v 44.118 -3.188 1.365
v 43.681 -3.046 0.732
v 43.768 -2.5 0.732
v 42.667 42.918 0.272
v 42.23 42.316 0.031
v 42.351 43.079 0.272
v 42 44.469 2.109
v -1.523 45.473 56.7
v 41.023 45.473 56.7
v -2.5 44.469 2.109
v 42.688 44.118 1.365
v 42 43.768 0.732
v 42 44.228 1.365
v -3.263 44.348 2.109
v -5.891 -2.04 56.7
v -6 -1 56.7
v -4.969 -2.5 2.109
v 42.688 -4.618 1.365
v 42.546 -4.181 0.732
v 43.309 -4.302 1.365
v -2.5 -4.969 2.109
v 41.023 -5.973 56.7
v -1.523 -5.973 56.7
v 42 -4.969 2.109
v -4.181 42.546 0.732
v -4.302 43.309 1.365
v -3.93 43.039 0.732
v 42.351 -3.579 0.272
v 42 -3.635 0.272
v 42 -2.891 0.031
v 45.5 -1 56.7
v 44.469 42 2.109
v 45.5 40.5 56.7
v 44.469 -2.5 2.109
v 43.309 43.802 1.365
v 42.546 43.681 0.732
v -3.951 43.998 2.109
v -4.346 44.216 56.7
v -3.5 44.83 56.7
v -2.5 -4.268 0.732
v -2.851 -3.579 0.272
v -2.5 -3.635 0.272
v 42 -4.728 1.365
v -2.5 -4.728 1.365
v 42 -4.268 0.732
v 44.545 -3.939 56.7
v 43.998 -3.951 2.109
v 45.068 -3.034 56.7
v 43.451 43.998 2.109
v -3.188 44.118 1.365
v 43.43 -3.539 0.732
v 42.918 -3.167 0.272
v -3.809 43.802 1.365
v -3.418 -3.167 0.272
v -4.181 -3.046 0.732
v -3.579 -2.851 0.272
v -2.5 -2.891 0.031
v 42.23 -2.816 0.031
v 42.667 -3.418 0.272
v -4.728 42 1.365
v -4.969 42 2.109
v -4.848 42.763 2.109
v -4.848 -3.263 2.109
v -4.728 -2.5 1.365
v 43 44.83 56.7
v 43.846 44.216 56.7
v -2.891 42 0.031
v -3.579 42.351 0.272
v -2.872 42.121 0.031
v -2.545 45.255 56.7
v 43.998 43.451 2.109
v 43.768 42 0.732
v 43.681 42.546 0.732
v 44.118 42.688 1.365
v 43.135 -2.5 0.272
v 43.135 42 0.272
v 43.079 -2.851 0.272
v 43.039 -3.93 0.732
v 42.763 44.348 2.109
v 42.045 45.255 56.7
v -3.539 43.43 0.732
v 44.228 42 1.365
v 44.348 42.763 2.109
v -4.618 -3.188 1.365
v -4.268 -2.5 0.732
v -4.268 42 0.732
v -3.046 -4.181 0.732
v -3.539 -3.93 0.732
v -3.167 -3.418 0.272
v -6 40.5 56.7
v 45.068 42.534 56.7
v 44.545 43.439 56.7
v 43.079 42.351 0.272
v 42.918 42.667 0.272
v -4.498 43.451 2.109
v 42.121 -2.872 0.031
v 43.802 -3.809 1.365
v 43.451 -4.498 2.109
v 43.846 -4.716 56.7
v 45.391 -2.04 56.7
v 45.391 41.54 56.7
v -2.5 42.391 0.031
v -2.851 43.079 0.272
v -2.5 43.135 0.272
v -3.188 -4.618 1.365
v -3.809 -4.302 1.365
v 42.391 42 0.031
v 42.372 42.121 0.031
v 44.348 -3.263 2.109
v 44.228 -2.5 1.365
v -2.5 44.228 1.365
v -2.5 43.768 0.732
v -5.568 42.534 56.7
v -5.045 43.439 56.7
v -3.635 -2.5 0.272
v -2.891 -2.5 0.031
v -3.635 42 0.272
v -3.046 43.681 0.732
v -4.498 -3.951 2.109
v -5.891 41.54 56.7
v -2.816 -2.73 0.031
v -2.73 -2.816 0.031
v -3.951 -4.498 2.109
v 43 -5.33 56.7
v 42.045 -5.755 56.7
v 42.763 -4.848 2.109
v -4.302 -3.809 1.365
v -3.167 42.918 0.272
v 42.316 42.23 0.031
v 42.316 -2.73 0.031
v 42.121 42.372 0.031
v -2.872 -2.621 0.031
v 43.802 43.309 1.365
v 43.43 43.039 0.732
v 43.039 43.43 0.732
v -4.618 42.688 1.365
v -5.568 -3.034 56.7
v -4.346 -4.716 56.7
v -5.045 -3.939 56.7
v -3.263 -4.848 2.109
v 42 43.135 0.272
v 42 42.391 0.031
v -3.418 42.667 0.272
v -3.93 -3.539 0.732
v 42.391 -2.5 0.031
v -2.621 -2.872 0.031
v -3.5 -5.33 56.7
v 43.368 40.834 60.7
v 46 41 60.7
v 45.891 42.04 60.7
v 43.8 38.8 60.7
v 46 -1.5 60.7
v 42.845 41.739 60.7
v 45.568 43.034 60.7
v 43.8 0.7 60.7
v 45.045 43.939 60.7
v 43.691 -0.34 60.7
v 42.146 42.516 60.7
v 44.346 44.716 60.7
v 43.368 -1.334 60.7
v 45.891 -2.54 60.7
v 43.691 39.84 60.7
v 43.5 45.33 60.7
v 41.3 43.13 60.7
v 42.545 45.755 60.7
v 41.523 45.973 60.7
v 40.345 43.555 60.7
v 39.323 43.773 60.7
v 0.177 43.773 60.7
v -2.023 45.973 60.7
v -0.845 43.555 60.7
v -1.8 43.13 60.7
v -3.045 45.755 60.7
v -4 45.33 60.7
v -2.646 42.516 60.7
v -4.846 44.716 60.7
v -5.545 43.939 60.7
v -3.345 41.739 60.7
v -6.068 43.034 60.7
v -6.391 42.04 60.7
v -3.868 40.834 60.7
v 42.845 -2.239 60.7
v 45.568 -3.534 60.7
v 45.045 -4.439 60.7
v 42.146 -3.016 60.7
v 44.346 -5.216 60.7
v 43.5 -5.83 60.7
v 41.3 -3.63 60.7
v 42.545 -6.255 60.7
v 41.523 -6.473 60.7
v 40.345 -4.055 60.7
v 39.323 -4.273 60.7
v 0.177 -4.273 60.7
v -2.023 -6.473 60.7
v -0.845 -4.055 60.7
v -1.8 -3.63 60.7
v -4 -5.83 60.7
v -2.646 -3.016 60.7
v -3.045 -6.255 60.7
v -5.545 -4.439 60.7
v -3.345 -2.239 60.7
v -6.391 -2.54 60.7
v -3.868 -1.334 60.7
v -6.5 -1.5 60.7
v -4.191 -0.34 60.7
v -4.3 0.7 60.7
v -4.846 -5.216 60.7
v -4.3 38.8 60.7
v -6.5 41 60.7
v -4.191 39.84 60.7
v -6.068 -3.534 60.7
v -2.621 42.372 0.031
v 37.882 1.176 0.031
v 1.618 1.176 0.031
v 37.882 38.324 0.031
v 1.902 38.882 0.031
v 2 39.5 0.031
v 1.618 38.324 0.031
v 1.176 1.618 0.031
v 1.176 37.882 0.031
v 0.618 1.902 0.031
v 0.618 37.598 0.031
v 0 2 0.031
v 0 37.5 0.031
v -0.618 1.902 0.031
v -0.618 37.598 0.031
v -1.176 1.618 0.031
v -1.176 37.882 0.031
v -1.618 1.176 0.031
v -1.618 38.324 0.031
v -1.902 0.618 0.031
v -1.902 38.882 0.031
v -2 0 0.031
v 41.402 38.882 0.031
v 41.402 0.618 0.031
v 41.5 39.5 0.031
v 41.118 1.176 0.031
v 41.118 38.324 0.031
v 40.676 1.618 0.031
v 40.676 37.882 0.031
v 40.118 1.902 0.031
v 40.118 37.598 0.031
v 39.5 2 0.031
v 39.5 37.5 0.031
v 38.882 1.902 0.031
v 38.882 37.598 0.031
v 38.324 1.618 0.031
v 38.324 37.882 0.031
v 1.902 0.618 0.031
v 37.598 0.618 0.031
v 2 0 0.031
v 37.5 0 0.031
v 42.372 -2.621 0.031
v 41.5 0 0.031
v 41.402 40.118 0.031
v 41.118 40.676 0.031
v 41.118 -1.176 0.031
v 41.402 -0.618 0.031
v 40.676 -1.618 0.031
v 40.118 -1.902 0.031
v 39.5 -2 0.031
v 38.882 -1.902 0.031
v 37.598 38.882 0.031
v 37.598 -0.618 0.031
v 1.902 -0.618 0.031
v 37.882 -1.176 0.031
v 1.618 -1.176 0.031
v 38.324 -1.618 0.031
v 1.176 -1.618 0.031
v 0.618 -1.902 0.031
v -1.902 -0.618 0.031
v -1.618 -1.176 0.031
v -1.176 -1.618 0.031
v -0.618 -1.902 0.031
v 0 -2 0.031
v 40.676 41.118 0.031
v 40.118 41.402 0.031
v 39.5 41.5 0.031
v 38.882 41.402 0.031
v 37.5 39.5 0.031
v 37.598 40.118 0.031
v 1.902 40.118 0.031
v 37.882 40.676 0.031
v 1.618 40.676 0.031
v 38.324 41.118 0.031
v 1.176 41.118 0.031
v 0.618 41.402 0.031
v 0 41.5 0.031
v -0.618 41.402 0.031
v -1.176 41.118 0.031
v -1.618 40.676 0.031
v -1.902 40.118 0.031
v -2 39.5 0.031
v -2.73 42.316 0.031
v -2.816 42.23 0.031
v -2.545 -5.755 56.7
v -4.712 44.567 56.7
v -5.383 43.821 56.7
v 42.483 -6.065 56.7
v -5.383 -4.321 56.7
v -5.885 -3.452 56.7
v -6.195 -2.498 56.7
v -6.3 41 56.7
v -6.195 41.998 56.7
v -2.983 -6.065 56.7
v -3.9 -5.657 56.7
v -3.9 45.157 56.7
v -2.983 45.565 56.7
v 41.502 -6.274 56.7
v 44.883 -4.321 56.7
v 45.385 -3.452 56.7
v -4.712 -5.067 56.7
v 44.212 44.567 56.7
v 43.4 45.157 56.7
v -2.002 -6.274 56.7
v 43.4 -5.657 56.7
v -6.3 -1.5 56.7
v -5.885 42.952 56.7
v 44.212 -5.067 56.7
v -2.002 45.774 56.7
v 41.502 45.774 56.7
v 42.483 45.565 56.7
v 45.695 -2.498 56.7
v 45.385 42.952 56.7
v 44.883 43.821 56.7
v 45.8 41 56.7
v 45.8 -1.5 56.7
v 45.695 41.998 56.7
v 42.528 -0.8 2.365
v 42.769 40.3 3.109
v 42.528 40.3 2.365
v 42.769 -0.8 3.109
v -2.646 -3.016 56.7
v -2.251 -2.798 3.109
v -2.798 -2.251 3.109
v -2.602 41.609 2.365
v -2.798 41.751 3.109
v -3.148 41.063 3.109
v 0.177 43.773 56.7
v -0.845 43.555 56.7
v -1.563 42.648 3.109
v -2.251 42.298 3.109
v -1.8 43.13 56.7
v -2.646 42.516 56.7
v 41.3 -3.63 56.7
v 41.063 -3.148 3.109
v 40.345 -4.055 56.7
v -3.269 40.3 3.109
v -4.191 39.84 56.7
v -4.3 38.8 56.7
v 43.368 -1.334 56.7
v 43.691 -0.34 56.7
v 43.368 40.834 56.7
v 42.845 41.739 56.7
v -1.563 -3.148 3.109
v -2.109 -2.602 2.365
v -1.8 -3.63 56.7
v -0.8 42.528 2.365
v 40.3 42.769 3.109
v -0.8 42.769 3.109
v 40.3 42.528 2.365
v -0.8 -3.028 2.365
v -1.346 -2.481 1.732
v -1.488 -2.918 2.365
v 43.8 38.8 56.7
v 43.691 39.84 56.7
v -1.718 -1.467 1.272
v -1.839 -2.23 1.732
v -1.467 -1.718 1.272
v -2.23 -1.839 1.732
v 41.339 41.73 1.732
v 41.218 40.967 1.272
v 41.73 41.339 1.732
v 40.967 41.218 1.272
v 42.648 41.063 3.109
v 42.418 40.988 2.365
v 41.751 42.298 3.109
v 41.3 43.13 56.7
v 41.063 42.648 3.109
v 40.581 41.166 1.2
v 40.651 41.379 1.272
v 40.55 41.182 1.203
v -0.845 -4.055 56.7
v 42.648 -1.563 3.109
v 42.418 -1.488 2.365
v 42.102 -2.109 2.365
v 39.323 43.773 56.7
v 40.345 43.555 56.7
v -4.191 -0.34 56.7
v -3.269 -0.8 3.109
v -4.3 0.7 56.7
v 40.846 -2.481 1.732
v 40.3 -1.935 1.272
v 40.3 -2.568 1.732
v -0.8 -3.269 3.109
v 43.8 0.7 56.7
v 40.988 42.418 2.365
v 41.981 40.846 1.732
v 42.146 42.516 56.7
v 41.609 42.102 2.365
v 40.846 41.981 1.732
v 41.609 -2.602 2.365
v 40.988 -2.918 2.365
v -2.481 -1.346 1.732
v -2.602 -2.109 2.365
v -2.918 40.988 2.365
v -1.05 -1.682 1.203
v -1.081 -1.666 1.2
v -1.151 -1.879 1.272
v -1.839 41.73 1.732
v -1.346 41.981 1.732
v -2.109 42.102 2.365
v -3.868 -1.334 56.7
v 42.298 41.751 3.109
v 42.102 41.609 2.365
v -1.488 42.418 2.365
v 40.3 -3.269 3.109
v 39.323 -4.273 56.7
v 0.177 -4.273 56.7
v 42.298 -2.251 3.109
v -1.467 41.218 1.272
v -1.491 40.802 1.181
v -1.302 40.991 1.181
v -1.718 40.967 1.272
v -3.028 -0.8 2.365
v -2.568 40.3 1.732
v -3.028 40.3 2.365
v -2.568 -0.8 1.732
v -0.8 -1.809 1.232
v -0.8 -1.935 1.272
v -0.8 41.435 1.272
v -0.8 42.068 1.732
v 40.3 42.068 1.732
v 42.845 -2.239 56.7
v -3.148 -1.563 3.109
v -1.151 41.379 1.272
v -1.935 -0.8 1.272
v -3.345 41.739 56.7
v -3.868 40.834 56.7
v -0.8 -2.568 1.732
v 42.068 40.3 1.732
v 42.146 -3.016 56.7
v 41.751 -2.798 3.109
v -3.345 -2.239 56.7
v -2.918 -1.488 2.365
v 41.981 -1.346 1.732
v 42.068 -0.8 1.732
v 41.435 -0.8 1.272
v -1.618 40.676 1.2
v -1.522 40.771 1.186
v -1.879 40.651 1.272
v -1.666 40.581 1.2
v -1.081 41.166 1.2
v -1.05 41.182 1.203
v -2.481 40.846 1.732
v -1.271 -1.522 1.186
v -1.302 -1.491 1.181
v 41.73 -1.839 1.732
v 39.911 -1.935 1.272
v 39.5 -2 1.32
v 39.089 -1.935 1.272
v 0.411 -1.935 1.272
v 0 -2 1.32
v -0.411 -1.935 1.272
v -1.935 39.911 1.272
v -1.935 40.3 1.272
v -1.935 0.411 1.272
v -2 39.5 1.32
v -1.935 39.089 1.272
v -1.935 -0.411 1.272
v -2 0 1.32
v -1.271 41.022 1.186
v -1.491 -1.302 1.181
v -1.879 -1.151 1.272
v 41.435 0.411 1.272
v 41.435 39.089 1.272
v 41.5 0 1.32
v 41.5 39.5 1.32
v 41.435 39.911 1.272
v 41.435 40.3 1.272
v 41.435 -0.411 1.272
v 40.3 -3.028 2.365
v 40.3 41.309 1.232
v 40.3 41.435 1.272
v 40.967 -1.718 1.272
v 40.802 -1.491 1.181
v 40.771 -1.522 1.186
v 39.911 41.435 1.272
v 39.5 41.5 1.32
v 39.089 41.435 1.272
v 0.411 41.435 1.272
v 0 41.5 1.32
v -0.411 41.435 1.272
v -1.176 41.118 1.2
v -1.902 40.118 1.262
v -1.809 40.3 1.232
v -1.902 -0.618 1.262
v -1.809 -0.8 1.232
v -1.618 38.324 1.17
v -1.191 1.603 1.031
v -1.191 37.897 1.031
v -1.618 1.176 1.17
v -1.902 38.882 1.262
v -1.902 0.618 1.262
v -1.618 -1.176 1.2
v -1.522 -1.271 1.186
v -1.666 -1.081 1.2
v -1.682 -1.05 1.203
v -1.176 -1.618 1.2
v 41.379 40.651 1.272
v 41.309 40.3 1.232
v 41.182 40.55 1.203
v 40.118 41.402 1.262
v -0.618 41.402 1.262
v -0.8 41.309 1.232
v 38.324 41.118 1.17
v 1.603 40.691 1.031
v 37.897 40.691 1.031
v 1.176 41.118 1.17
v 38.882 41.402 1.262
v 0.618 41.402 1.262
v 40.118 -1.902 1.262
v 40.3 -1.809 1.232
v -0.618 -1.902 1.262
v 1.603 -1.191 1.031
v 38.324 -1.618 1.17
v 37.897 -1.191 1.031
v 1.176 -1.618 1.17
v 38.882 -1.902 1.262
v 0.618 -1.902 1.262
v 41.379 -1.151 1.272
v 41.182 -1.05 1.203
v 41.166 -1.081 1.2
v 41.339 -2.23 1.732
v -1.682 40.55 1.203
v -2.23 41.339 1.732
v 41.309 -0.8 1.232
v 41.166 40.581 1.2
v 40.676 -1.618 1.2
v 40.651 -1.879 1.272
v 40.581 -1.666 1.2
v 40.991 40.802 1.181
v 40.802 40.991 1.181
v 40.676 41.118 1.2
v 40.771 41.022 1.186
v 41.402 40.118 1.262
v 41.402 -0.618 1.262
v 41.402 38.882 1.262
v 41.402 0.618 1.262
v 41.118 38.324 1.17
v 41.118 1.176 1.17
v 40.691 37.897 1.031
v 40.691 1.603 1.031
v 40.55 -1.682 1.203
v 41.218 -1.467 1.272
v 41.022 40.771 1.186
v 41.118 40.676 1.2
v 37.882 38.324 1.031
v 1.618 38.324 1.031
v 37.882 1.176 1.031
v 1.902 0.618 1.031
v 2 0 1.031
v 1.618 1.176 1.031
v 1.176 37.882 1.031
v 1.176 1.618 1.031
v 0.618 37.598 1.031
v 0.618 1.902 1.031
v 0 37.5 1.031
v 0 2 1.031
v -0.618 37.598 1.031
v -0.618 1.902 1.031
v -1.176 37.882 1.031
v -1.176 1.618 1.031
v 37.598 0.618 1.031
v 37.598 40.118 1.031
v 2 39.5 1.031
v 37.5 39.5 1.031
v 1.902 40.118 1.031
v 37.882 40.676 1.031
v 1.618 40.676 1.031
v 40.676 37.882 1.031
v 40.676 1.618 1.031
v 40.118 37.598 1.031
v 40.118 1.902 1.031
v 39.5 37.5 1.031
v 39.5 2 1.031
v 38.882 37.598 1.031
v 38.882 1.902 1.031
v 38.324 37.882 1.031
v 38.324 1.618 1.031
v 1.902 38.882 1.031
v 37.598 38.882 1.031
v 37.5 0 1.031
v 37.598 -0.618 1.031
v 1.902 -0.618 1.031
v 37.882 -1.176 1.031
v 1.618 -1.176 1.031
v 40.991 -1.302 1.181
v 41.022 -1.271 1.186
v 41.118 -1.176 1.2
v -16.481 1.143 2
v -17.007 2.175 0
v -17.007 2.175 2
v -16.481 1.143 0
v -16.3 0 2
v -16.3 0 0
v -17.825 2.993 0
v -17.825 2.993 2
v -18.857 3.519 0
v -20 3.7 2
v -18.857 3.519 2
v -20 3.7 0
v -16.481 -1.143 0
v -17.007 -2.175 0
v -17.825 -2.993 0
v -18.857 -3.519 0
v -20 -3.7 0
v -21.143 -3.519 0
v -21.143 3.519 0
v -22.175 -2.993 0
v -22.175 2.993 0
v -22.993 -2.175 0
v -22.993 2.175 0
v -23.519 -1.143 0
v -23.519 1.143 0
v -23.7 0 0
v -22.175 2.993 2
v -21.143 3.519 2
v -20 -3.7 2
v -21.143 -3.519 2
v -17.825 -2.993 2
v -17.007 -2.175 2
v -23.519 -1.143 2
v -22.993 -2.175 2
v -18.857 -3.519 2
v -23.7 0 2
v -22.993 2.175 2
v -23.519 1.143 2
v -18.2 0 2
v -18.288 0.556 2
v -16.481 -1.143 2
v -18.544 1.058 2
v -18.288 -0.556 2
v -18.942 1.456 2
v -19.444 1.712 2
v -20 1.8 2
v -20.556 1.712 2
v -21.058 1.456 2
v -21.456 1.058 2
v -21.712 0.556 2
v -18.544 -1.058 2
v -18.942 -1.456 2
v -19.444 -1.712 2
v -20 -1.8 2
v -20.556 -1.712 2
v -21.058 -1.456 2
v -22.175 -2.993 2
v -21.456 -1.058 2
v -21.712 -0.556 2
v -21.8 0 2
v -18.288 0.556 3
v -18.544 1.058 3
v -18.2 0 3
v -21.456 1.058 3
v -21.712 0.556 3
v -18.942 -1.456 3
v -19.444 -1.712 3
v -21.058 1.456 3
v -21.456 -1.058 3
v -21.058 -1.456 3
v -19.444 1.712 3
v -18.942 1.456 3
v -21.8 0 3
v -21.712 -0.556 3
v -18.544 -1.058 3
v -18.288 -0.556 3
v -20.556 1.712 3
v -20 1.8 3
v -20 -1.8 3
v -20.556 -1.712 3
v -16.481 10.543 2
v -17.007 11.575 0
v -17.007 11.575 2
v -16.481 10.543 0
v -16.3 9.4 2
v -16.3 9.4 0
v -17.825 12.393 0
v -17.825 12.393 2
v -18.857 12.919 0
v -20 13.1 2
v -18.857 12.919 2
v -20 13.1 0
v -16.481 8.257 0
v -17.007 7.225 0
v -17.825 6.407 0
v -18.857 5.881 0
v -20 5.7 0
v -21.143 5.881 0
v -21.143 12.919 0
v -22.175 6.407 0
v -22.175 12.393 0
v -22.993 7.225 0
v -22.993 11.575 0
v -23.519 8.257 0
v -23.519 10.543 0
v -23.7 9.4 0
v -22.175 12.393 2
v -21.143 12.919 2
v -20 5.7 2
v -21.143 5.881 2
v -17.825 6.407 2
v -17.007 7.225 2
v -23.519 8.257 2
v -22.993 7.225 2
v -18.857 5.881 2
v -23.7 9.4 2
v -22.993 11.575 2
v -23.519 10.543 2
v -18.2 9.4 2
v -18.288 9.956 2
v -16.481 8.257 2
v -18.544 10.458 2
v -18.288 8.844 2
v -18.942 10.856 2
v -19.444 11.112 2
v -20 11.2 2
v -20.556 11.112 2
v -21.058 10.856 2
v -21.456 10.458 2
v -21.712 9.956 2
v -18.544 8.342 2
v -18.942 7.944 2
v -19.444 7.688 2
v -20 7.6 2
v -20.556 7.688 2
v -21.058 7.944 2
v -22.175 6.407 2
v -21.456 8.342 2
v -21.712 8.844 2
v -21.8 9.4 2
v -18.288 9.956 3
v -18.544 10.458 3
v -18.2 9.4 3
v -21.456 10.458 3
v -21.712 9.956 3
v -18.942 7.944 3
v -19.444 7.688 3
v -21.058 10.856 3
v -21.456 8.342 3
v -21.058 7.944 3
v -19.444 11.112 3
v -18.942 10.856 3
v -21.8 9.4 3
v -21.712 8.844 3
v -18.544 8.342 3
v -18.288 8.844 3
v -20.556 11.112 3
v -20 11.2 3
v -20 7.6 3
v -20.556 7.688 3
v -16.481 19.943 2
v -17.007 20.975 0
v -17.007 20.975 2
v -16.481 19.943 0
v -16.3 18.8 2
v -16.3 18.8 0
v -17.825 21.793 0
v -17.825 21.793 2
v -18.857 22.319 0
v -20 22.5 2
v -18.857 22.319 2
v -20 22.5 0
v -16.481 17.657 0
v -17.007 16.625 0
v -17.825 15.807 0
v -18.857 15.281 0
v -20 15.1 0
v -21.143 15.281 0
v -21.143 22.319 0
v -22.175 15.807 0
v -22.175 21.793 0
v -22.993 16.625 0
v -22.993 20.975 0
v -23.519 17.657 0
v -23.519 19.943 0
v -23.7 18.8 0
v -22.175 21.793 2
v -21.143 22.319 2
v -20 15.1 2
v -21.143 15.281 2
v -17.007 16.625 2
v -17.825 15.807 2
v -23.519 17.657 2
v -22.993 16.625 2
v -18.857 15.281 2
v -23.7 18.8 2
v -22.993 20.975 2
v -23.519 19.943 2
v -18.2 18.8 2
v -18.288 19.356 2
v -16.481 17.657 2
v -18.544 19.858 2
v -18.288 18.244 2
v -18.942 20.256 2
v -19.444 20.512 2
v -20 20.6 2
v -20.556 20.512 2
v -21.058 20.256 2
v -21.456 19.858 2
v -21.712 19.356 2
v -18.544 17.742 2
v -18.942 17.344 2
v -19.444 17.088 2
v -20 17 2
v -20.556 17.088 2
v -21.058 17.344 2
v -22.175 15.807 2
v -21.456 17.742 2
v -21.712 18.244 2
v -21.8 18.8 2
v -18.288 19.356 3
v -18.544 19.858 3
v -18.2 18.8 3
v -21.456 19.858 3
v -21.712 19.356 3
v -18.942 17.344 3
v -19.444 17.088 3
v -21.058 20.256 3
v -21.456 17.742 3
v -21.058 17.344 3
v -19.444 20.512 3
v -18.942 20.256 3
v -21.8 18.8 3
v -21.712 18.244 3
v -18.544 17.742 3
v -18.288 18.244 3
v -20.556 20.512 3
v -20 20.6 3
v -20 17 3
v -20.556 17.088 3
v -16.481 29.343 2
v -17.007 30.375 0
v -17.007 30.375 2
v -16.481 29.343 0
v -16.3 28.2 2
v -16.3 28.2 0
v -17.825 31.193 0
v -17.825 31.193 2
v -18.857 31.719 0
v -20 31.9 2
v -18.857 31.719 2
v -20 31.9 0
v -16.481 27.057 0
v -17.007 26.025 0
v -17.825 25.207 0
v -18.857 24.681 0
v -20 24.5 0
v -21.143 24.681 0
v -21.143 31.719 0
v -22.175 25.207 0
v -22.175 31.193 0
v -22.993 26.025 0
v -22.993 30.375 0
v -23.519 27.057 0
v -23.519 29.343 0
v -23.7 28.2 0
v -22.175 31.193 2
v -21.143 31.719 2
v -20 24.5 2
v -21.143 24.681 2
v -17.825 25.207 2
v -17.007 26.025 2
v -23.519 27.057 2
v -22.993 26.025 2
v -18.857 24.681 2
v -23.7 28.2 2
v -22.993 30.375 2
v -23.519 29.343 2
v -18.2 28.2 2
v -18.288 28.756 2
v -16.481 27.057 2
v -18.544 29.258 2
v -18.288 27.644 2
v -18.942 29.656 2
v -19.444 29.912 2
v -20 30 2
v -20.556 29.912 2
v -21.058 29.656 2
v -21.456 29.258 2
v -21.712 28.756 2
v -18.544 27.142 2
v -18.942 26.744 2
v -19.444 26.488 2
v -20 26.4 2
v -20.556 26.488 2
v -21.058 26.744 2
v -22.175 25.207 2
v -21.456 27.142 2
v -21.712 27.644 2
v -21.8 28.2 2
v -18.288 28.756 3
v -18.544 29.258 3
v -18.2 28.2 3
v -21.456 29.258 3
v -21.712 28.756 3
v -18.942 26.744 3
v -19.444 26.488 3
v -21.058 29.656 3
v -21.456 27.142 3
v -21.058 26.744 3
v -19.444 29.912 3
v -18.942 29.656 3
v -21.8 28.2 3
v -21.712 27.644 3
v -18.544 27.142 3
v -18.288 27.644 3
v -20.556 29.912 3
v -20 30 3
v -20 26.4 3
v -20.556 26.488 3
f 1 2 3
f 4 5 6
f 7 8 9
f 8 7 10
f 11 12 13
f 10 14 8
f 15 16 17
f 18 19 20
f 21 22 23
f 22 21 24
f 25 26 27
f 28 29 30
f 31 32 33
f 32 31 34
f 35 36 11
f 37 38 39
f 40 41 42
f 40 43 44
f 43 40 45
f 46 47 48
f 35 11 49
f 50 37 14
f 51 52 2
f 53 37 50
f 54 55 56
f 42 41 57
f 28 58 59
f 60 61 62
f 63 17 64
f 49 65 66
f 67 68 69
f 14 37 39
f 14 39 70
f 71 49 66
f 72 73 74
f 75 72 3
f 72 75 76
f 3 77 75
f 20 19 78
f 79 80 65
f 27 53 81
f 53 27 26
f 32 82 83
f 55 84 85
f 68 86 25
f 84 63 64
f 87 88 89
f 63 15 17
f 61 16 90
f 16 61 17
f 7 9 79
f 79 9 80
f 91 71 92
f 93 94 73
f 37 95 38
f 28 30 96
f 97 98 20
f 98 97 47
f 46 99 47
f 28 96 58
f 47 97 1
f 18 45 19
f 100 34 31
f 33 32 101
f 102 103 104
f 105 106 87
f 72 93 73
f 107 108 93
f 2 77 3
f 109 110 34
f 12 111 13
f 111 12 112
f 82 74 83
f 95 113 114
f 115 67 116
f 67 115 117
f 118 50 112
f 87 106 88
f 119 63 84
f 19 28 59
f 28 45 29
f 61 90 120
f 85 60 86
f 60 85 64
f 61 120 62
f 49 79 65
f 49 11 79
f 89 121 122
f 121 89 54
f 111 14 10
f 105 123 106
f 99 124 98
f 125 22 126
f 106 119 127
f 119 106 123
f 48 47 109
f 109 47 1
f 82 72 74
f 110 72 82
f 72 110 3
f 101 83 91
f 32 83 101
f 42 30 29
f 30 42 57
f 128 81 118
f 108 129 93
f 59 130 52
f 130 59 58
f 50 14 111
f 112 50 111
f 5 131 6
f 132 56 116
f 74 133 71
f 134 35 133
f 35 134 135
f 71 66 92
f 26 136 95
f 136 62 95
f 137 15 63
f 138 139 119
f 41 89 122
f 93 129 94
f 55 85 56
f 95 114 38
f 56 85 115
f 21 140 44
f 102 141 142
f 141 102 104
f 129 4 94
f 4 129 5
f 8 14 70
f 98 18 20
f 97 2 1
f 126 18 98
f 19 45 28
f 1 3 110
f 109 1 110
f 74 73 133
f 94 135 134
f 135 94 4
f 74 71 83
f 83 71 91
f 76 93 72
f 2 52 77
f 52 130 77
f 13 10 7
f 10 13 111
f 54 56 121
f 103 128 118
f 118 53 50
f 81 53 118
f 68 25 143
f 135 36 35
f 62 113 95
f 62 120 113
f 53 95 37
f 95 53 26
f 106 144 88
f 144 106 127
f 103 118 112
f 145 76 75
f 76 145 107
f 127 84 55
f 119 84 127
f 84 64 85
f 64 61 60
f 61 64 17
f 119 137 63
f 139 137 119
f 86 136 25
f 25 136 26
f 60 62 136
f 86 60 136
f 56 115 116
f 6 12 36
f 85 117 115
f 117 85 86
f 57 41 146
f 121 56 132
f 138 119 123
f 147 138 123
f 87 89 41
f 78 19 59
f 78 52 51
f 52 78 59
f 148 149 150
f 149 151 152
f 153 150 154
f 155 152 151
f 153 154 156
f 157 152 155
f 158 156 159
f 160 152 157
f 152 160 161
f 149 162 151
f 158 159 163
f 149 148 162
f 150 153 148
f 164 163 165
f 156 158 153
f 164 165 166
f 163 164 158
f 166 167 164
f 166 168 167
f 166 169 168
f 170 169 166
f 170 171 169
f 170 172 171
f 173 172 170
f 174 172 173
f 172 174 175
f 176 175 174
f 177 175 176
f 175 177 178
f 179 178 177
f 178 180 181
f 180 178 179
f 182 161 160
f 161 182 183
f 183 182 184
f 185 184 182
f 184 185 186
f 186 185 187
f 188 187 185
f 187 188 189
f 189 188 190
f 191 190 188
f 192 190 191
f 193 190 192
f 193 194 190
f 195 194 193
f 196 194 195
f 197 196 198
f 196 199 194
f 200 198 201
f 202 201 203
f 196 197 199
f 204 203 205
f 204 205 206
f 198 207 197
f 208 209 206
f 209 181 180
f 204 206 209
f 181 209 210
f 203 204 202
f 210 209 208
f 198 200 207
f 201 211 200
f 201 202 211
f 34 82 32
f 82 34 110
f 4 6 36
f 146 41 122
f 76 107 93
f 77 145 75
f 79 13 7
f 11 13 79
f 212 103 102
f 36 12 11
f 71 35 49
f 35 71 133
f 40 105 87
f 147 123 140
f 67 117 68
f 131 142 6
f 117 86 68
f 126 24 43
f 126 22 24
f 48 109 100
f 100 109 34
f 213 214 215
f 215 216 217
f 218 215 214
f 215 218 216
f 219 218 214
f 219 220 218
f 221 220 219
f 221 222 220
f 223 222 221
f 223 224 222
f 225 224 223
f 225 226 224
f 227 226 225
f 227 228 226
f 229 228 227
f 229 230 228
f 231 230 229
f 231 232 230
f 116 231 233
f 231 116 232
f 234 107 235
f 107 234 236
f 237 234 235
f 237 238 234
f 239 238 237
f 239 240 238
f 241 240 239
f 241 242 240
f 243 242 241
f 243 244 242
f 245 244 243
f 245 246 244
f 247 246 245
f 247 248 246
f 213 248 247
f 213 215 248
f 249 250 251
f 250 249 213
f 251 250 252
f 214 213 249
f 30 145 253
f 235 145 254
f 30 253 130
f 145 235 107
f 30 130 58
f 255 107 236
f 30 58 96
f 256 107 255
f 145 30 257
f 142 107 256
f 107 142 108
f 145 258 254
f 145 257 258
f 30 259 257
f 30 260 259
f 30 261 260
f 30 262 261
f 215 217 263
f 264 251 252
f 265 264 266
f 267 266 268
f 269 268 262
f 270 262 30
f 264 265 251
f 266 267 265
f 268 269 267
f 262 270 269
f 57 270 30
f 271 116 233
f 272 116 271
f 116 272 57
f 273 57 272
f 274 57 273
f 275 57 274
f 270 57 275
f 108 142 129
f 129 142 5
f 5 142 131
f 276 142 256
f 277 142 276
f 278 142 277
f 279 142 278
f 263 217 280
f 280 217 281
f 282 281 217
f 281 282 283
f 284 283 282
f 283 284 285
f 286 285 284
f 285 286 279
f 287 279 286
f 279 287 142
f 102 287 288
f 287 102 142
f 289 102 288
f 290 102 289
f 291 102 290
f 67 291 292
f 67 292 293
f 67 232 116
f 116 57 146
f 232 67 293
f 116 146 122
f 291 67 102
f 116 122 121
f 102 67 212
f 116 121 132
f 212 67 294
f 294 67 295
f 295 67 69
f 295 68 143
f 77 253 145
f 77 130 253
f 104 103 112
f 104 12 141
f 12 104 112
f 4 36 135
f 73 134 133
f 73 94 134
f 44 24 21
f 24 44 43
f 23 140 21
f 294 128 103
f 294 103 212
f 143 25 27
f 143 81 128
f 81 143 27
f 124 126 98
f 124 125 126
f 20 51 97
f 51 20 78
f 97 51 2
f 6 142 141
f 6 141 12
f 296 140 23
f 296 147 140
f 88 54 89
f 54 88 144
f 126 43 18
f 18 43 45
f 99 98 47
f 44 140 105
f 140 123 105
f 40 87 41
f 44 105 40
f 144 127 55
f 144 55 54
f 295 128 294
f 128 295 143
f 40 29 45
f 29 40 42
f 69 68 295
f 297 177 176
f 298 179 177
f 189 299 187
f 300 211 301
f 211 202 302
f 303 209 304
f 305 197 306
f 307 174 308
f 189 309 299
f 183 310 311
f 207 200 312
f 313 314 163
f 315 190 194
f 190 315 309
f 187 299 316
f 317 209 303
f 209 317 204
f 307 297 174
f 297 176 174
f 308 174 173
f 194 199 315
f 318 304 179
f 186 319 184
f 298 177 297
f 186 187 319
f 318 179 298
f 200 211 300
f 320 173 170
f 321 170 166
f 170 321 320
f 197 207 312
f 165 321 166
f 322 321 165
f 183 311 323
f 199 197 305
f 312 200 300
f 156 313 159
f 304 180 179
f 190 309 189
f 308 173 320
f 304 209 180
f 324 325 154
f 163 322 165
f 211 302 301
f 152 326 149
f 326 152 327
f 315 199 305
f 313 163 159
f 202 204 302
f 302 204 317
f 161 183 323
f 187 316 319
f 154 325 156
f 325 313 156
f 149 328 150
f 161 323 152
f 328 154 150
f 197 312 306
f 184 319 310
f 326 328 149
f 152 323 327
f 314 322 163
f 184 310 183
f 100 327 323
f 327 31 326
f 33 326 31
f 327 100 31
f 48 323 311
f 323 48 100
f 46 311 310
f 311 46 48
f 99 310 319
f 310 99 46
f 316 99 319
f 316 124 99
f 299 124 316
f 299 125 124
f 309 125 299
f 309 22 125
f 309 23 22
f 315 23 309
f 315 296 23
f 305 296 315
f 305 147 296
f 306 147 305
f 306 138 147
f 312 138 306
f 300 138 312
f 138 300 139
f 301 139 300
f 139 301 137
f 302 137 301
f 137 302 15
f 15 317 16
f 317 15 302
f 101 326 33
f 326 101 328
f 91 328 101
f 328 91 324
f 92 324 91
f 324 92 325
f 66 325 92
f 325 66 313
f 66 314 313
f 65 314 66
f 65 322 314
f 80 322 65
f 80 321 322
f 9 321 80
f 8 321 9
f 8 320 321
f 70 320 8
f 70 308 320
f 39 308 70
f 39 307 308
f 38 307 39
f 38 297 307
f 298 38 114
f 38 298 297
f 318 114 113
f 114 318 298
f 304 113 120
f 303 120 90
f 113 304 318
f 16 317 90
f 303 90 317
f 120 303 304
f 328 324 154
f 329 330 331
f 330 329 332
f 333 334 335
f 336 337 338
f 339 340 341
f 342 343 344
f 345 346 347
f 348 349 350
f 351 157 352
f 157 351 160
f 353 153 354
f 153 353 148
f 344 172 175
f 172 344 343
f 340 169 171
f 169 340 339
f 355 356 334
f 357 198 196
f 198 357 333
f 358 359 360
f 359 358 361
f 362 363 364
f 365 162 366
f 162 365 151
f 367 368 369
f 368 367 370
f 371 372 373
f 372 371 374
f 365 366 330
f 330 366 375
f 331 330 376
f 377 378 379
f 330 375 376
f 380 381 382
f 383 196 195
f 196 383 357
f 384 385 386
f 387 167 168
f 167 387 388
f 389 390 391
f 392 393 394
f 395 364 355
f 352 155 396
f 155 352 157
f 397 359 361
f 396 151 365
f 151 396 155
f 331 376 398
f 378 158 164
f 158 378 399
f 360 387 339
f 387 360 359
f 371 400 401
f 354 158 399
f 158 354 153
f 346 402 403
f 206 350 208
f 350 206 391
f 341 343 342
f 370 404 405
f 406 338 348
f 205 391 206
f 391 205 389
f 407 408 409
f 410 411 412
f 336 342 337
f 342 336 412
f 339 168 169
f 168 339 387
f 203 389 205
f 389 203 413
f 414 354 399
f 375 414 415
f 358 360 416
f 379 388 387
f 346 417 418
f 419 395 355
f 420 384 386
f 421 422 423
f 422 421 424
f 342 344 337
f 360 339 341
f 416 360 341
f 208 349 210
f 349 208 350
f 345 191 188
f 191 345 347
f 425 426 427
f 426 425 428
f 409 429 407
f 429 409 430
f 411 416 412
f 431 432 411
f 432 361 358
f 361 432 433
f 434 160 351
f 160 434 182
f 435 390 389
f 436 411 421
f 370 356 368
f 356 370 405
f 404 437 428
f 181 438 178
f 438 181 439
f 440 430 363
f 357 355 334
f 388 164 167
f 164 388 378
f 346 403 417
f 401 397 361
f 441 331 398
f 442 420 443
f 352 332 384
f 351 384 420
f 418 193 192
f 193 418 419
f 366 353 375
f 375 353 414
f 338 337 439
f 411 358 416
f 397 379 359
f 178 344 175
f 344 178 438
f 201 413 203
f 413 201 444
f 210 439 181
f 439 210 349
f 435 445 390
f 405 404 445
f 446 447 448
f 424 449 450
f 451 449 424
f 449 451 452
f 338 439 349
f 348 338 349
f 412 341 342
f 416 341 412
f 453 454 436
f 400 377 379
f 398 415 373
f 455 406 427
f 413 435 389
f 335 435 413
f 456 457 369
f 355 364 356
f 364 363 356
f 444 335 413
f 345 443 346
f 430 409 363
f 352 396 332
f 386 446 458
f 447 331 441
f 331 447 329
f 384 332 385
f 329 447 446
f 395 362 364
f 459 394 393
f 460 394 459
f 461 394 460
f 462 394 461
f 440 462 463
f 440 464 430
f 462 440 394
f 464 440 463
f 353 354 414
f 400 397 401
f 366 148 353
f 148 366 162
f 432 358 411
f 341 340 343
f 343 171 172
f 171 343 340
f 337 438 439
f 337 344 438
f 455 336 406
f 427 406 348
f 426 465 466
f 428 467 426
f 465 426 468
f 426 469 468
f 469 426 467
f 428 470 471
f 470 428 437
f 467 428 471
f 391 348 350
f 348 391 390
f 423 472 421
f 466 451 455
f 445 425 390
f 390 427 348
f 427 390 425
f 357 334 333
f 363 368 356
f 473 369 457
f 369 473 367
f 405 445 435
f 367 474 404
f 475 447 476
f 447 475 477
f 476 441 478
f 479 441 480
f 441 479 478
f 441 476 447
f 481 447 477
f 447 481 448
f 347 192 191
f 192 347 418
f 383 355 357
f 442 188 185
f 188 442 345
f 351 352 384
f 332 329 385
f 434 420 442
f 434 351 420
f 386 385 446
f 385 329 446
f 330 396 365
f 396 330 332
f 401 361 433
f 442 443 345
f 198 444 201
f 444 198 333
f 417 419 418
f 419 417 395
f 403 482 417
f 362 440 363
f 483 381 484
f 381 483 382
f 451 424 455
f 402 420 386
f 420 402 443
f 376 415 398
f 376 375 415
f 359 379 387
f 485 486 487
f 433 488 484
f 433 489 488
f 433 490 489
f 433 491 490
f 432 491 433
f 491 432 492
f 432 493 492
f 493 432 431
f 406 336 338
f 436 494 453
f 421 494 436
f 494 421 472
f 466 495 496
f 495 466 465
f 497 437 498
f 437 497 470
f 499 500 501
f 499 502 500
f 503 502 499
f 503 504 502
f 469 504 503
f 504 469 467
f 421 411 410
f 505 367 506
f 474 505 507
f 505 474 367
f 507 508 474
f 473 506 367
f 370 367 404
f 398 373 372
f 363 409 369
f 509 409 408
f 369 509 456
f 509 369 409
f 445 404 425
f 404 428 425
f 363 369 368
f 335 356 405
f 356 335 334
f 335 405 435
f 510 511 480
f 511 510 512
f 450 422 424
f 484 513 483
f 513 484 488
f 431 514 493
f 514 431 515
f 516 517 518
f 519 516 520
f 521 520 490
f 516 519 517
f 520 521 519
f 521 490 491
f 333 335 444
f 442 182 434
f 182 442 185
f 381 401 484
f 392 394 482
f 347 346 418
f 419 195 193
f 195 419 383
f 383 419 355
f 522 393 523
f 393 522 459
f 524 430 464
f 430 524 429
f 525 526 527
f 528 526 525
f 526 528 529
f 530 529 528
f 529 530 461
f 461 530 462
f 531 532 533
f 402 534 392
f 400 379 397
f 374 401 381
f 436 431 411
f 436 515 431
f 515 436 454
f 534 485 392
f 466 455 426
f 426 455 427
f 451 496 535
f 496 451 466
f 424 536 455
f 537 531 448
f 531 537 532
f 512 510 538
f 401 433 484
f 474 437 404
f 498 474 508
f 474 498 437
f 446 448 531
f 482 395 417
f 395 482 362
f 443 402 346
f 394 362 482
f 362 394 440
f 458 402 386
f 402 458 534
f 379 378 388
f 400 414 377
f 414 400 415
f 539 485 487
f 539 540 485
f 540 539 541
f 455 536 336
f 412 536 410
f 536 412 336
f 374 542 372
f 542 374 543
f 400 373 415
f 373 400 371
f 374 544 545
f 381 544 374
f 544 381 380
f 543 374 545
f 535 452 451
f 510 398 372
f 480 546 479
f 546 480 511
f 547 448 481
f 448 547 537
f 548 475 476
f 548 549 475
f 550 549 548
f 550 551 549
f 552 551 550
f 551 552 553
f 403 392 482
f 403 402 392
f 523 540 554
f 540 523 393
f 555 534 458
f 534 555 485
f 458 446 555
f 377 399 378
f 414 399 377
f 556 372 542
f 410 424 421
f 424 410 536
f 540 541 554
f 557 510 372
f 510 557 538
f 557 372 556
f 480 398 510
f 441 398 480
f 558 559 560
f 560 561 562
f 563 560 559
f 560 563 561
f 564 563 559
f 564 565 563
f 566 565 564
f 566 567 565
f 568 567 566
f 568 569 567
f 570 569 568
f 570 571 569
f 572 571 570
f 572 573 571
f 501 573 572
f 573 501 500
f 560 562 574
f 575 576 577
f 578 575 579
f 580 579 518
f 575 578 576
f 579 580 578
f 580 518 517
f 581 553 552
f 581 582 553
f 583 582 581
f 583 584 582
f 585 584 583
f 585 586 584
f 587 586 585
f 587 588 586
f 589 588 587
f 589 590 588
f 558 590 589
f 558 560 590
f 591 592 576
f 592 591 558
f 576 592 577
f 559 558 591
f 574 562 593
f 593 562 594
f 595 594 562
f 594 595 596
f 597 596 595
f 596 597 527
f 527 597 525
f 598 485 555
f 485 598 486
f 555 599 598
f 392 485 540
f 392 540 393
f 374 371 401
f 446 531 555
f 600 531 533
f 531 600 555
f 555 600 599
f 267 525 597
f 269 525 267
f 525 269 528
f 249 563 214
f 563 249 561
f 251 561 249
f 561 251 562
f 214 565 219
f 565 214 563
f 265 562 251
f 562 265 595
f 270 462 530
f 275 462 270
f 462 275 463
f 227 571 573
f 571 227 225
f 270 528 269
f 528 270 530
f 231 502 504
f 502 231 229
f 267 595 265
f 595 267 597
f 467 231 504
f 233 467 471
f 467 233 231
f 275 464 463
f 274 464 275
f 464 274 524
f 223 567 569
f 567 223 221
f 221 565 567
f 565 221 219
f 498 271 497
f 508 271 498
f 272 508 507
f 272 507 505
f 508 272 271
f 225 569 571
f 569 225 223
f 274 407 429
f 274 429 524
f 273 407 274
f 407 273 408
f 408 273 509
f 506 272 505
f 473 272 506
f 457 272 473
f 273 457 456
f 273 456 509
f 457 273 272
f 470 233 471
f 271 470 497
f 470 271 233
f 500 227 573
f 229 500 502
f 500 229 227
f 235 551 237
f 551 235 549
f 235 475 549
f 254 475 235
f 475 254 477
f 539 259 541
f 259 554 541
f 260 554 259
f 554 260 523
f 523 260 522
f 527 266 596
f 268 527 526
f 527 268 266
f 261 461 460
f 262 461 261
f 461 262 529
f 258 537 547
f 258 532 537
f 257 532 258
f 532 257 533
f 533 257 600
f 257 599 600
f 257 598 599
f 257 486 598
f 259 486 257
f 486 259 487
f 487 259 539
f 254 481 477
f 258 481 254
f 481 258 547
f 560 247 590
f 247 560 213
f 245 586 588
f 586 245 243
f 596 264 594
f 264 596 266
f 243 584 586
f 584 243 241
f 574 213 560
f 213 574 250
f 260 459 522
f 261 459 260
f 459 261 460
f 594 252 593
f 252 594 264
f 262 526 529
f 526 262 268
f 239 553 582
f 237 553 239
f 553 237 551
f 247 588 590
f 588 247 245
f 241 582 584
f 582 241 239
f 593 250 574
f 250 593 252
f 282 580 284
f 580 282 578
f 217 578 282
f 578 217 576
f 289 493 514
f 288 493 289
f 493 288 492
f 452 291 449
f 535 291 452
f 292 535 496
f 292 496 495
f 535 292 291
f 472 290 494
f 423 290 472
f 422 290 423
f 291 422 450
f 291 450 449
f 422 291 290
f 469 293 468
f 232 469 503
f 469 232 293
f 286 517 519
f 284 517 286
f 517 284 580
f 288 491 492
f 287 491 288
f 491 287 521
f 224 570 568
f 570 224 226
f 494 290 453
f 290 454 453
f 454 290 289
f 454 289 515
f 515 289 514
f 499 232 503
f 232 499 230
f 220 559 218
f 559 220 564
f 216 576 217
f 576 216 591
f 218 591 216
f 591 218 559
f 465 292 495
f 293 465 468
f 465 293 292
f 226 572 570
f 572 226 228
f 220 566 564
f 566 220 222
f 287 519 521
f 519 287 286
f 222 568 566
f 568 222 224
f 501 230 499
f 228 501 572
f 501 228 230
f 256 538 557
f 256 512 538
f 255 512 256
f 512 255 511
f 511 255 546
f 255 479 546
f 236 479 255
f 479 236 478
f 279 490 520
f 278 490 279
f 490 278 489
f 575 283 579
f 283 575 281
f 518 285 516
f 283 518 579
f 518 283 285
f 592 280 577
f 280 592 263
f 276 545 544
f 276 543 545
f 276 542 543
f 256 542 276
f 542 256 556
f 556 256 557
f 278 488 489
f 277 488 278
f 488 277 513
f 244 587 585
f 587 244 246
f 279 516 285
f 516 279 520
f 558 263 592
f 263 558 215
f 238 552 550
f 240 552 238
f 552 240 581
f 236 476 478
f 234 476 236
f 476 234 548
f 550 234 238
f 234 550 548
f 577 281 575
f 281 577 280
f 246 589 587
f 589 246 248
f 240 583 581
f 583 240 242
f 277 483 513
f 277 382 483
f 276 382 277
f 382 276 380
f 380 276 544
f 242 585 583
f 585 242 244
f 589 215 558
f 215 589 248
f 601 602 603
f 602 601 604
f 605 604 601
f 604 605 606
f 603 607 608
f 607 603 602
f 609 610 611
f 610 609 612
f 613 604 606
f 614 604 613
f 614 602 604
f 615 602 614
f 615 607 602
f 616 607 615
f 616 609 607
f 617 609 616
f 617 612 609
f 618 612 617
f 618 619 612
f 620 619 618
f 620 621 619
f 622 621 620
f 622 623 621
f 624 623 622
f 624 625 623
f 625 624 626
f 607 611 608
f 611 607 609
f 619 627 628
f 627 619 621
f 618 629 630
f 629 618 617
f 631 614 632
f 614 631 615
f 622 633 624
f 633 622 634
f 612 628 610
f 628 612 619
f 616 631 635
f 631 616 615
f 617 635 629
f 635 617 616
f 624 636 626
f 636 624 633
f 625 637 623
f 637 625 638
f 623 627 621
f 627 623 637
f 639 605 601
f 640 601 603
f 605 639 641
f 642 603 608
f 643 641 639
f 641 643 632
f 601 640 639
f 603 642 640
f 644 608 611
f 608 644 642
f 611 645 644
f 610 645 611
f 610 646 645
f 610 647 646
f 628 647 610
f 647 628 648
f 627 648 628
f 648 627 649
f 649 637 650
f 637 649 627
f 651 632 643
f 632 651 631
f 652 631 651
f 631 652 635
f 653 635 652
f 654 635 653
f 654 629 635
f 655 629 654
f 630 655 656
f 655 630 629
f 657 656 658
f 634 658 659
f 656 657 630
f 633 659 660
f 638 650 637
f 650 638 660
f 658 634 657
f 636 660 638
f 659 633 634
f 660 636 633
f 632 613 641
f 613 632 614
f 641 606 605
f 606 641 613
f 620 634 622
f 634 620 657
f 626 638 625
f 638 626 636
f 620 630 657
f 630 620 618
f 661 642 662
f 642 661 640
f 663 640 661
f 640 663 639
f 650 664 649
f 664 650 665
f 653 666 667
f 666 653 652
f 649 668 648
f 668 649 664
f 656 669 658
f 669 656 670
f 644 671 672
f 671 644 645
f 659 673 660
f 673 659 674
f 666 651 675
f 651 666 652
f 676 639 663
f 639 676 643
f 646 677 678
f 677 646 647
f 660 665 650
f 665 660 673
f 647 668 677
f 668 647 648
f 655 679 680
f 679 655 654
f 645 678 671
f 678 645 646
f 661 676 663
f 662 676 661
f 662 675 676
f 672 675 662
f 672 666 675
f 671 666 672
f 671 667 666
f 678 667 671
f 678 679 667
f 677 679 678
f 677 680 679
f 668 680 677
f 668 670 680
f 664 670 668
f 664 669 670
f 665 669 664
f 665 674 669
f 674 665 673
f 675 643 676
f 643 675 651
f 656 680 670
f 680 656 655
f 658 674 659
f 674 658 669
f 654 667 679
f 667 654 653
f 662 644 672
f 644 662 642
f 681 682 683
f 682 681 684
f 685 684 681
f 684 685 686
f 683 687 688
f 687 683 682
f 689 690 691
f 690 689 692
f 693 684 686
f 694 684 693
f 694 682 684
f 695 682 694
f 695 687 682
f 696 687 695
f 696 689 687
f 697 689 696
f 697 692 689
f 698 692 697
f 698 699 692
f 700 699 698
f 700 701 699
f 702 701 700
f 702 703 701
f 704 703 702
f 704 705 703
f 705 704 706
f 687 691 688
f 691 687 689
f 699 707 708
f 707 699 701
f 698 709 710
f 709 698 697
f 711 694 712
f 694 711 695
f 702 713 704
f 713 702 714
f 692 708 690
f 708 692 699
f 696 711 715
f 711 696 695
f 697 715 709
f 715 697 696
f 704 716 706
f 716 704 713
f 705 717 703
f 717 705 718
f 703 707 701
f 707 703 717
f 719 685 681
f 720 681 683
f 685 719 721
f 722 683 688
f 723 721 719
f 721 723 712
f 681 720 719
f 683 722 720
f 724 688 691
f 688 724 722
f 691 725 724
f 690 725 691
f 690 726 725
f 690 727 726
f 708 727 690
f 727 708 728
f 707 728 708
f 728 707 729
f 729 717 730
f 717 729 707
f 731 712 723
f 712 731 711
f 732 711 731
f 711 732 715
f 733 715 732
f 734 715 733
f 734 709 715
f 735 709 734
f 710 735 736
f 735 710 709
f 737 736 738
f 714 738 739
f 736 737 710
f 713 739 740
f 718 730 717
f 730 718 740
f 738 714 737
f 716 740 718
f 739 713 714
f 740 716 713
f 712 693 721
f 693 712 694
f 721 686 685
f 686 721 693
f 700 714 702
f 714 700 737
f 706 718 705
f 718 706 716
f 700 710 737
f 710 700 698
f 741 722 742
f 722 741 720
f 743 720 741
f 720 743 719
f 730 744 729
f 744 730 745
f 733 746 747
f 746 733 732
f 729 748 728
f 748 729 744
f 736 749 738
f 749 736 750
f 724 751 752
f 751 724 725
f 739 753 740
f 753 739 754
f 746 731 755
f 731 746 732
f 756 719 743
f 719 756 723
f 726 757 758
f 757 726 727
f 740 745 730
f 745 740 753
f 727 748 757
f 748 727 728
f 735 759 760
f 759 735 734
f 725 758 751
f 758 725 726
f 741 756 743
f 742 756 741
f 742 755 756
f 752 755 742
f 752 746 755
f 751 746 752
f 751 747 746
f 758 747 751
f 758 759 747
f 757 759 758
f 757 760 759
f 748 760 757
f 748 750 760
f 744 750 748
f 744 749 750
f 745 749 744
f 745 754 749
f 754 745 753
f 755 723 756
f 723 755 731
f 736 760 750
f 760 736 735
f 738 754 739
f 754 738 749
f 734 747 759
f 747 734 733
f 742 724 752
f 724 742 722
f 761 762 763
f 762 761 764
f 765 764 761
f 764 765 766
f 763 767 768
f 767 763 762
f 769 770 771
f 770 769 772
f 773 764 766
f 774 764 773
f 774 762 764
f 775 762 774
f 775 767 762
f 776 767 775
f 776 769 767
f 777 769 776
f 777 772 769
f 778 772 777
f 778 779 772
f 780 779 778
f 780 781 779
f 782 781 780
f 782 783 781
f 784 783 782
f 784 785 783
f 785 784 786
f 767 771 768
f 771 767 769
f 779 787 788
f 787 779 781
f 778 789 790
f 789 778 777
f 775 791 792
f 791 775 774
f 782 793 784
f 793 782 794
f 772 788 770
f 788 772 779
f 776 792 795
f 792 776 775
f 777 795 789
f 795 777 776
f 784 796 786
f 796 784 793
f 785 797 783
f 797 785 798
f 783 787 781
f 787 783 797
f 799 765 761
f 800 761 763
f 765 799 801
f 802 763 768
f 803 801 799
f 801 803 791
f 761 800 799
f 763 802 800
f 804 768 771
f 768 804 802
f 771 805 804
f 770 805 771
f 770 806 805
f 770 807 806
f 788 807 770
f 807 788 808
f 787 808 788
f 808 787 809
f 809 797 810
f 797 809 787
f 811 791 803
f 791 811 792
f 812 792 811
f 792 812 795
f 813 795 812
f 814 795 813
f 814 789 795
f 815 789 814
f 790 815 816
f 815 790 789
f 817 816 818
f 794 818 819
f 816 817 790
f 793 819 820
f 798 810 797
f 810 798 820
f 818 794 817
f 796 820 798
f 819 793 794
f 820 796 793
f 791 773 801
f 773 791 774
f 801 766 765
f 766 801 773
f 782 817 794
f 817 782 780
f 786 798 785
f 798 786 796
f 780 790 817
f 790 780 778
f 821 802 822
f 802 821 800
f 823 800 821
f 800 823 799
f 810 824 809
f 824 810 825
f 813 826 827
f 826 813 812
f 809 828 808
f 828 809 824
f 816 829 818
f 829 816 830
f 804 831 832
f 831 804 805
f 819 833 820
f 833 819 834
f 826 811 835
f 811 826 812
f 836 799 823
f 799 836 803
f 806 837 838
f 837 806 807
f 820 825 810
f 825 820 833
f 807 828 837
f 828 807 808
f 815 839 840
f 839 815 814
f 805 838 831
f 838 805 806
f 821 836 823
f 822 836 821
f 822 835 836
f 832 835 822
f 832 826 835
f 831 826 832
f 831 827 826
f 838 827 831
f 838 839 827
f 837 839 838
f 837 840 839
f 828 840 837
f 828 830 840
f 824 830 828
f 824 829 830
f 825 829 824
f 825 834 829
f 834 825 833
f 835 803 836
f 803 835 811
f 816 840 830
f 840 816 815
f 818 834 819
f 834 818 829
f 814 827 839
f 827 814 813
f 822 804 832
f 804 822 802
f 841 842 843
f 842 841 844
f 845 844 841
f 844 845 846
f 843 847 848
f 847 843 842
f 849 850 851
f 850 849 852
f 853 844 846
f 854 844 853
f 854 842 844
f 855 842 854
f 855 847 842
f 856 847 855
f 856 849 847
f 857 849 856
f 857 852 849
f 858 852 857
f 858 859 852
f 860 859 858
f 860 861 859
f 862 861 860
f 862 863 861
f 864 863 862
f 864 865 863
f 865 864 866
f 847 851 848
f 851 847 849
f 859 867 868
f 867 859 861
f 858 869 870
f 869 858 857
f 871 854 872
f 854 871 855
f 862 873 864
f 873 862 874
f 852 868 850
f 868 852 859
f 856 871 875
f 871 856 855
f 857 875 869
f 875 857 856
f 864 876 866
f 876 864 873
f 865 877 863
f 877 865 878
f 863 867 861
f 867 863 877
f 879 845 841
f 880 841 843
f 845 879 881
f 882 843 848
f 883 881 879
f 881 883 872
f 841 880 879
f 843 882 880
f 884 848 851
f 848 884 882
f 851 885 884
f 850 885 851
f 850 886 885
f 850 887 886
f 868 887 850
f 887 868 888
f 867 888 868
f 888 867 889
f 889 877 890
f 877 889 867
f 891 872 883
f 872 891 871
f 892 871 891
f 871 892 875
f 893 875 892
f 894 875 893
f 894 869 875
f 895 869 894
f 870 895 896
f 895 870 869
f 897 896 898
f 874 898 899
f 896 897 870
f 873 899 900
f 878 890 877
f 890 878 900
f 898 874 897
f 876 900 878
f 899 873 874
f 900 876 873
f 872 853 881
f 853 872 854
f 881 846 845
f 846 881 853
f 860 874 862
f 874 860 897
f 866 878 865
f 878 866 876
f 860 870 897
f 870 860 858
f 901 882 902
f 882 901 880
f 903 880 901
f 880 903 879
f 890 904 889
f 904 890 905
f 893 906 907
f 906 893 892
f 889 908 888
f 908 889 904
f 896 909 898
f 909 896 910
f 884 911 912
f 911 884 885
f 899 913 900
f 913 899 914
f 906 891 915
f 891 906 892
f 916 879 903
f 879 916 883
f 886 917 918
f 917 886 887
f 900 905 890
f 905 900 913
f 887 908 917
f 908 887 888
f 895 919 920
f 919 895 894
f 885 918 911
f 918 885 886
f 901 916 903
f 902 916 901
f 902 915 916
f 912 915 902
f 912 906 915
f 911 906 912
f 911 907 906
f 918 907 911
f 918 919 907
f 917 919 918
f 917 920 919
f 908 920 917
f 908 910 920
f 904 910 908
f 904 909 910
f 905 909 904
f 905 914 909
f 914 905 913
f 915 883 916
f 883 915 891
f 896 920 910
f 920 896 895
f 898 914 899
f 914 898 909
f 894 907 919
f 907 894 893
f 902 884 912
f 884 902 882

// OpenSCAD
// created by pretenda
// http://www.thingiverse.com/pretenda/designs

// If you are reading this, sorry for my spaghetti code.

// Options!

/* [T-Boxx Insert] */
// What do you want to render out?
what = "both"; // [boxx:Boxx Insert,pegs:Pegs,both:Both Boxx Insert and Pegs]
// How many units wide?
modulesH = 1; // [1:8]
// How many units deep?
modulesV = 1; // [1:6]

/* [Misc Parameters] */
// Wall Thickness. Too thin and it is a bit flimsy, 1.7 seems about right for me.
wallThickness = 1.7;
// Peg Diameter. This width for me is quite snug, might need to dial it down depending on your printer.
pegDiameter = 7.4;

/* [Hidden] */
pegDistance = 39.5;
baseCornerDiameter = 5;
topCornerDiameter = 10;
topWidth = 52.5;
topLowerWidth = 51.5;
topInnerDiameter = 48.5;
bottomWidth = 49.5;
height = 60.7;



pegSlackH = (modulesH - 1) * ((topWidth - pegDistance));
pegSlackV = (modulesV - 1) * ((topWidth - pegDistance));

blPosX = 0;
blPosY = 0;

brPosX = modulesH * pegDistance + pegSlackH;
brPosY = 0;

tlPosX = 0;
tlPosY = modulesV * pegDistance + pegSlackH;

trPosX = modulesH * pegDistance + pegSlackH;
trPosY = modulesV * pegDistance + pegSlackH;

// Pegs?!
/*translate([0,0,-2]) {
cylinder(2, pegDiameter / 2, pegDiameter / 2);
translate([brPosX, 0, 0]) cylinder(2, pegDiameter / 2, pegDiameter / 2);
translate([0, tlPosY, 0]) cylinder(2, pegDiameter / 2, pegDiameter / 2);
translate([trPosX, trPosY, 0]) cylinder(2, pegDiameter / 2, pegDiameter / 2);
}*/

module boxx()
{

difference()
{

union()
{
hull()
{
translate([-(bottomWidth - pegDistance) / 2 + baseCornerDiameter / 2, -(bottomWidth - pegDistance) / 2 + baseCornerDiameter / 2, baseCornerDiameter / 2]) sphere(baseCornerDiameter/2, $fn = 20);

translate([brPosX, brPosY, 0]) translate([(bottomWidth - pegDistance) / 2 - baseCornerDiameter / 2, -(bottomWidth - pegDistance) / 2 + baseCornerDiameter / 2, baseCornerDiameter / 2]) sphere(baseCornerDiameter/2, $fn = 20);

translate([tlPosX, tlPosY, 0]) translate([-(bottomWidth - pegDistance) / 2 + baseCornerDiameter / 2, (bottomWidth - pegDistance) / 2 - baseCornerDiameter / 2, baseCornerDiameter / 2]) sphere(baseCornerDiameter/2, $fn = 20);

translate([trPosX, trPosY, 0]) translate([(bottomWidth - pegDistance) / 2 - baseCornerDiameter / 2, (bottomWidth - pegDistance) / 2 - baseCornerDiameter / 2, baseCornerDiameter / 2]) sphere(baseCornerDiameter/2, $fn = 20);

// Bottom
translate([blPosX, blPosY, height]) translate([-(topLowerWidth - pegDistance) / 2 + topCornerDiameter / 2, -(topLowerWidth - pegDistance) / 2 + topCornerDiameter / 2, -4]) cylinder(4, topCornerDiameter / 2, topCornerDiameter / 2, $fn = 30);

translate([brPosX, brPosY, height]) translate([(topLowerWidth - pegDistance) / 2 - topCornerDiameter / 2, -(topLowerWidth - pegDistance) / 2 + topCornerDiameter / 2, -4]) cylinder(4, topCornerDiameter / 2, topCornerDiameter / 2, $fn = 30);

translate([tlPosX, tlPosY, height]) translate([-(topLowerWidth - pegDistance) / 2 + topCornerDiameter / 2, (topLowerWidth - pegDistance) / 2 - topCornerDiameter / 2, -4]) cylinder(4, topCornerDiameter / 2, topCornerDiameter / 2, $fn = 30);

translate([trPosX, trPosY, height]) translate([(topLowerWidth - pegDistance) / 2 - topCornerDiameter / 2, (topLowerWidth - pegDistance) / 2 - topCornerDiameter / 2, -4]) cylinder(4, topCornerDiameter / 2, topCornerDiameter / 2, $fn = 30);
}


hull()
{


translate([blPosX, blPosY, height]) translate([-(topWidth - pegDistance) / 2 + topCornerDiameter / 2, -(topWidth - pegDistance) / 2 + topCornerDiameter / 2, -4]) cylinder(4, topCornerDiameter / 2 -0.2, topCornerDiameter / 2, $fn = 30);

translate([brPosX, brPosY, height]) translate([(topWidth - pegDistance) / 2 - topCornerDiameter / 2, -(topWidth - pegDistance) / 2 + topCornerDiameter / 2, -4]) cylinder(4, topCornerDiameter / 2 -0.2, topCornerDiameter / 2, $fn = 30);

translate([tlPosX, tlPosY, height]) translate([-(topWidth - pegDistance) / 2 + topCornerDiameter / 2, (topWidth - pegDistance) / 2 - topCornerDiameter / 2, -4]) cylinder(4, topCornerDiameter / 2 -0.2, topCornerDiameter / 2, $fn = 30);

translate([trPosX, trPosY, height]) translate([(topWidth - pegDistance) / 2 - topCornerDiameter / 2, (topWidth - pegDistance) / 2 - topCornerDiameter / 2, -4]) cylinder(4, topCornerDiameter / 2 -0.2, topCornerDiameter / 2, $fn = 30);

}
}




 // inside carved out
hull()
{
translate([blPosX +wallThickness, blPosY + wallThickness, 1]) translate([-(bottomWidth - pegDistance) / 2 + baseCornerDiameter / 2, -(bottomWidth - pegDistance) / 2 + baseCornerDiameter / 2, baseCornerDiameter / 2]) sphere(baseCornerDiameter/2, $fn = 20);

translate([brPosX - wallThickness, brPosY + wallThickness, 1]) translate([(bottomWidth - pegDistance) / 2 - baseCornerDiameter / 2, -(bottomWidth - pegDistance) / 2 + baseCornerDiameter / 2, baseCornerDiameter / 2]) sphere(baseCornerDiameter/2, $fn = 20);

translate([tlPosX + wallThickness, tlPosY - wallThickness, 1]) translate([-(bottomWidth - pegDistance) / 2 + baseCornerDiameter / 2, (bottomWidth - pegDistance) / 2 - baseCornerDiameter / 2, baseCornerDiameter / 2]) sphere(baseCornerDiameter/2, $fn = 20);

translate([trPosX - wallThickness, trPosY - wallThickness, 1]) translate([(bottomWidth - pegDistance) / 2 - baseCornerDiameter / 2, (bottomWidth - pegDistance) / 2 - baseCornerDiameter / 2, baseCornerDiameter / 2]) sphere(baseCornerDiameter/2, $fn = 20);

// Bottom
translate([blPosX + wallThickness, blPosY + wallThickness, height]) translate([-(topLowerWidth - pegDistance) / 2 + topCornerDiameter / 2, -(topLowerWidth - pegDistance) / 2 + topCornerDiameter / 2, -4]) cylinder(5, topCornerDiameter / 2, topCornerDiameter / 2, $fn = 30);

translate([brPosX - wallThickness, brPosY + wallThickness, height]) translate([(topLowerWidth - pegDistance) / 2 - topCornerDiameter / 2, -(topLowerWidth - pegDistance) / 2 + topCornerDiameter / 2, -4]) cylinder(5, topCornerDiameter / 2, topCornerDiameter / 2, $fn = 30);

translate([tlPosX + wallThickness, tlPosY - wallThickness, height]) translate([-(topLowerWidth - pegDistance) / 2 + topCornerDiameter / 2, (topLowerWidth - pegDistance) / 2 - topCornerDiameter / 2, -4]) cylinder(5, topCornerDiameter / 2, topCornerDiameter / 2, $fn = 30);

translate([trPosX - wallThickness, trPosY- wallThickness, height]) translate([(topLowerWidth - pegDistance) / 2 - topCornerDiameter / 2, (topLowerWidth - pegDistance) / 2 - topCornerDiameter / 2, -4]) cylinder(5, topCornerDiameter / 2, topCornerDiameter / 2, $fn = 30);
}


// Holes for pegs to slot into

cylinder(20, 2, 2, $fn = 20);
translate([brPosX, 0, 0]) cylinder(20, 2, 2, $fn = 20);
translate([0, tlPosY, 0]) cylinder(20, 2, 2, $fn = 20);
translate([trPosX, trPosY, 0]) cylinder(20, 2, 2, $fn = 20);

}
}




module peg() {
union()
{
cylinder(2, pegDiameter/2, pegDiameter/2, $fn = 20);
translate([0,0,1]) cylinder(2, 1.8, 1.8, $fn = 20);
}
}


if (what == "boxx" || what == "both")
{
// Boxx!

boxx();

}

if (what == "pegs" || what == "both")
{
// Pegs!
translate([-20,0,0]) {
translate([0, 0, 0]) peg();
translate([0, pegDiameter + 2, 0]) peg();
translate([0, (pegDiameter+2)*2, 0]) peg();
translate([0, (pegDiameter+2)*3, 0]) peg();
}


}
